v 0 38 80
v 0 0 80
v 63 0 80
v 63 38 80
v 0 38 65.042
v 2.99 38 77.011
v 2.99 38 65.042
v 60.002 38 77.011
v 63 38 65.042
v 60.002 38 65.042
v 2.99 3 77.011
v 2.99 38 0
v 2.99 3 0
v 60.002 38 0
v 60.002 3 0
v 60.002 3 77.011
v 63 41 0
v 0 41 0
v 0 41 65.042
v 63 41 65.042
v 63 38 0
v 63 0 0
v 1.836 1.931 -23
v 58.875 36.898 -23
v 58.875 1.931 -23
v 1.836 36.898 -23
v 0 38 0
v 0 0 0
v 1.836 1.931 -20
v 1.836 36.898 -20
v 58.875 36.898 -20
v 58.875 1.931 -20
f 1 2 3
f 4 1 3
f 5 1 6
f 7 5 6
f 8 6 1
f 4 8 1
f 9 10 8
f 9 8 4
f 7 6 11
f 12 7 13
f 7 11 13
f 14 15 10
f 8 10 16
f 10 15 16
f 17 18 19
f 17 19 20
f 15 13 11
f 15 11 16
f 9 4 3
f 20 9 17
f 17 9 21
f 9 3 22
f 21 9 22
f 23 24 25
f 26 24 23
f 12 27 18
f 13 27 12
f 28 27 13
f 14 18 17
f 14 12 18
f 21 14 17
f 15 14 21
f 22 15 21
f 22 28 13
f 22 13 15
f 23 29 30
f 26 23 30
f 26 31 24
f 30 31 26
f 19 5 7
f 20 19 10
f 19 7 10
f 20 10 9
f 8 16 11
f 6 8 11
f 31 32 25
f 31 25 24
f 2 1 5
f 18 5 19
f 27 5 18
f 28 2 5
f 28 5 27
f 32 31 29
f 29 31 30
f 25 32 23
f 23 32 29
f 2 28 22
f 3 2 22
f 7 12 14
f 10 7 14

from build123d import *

# Parameters (mm, degrees)
ESBO_O2_W                = 63
ESBO_O2_H                = 80
RESSALTO_EXTRUS_O1_DEPTH = 3
RESSALTO_EXTRUS_O2_DEPTH = 35
ESBO_O4_W                = 63
ESBO_O4_H                = 65.041847247
RESSALTO_EXTRUS_O3_DEPTH = 3
ESBO_O6_W                = 57.038627548
ESBO_O6_H                = 34.967547607
RESSALTO_EXTRUS_O4_DEPTH = 3


with BuildPart() as part:
    # Esboço2 → Ressalto-extrusão1 (new body)
    with BuildSketch(Plane(origin=(0, 0, 0), x_dir=(1, 0, 0), z_dir=(0, 1, 0))):
        with Locations((31.5, -40)):
            Rectangle(ESBO_O2_W, ESBO_O2_H)
    extrude(amount=RESSALTO_EXTRUS_O1_DEPTH)

    # Esboço3 → Ressalto-extrusão2 (add)
    with BuildSketch(Plane(origin=(0, 3, 0), x_dir=(1, 0, 0), z_dir=(0, 1, 0))):
        Polygon((63, -80), (63, 0), (60.001706293, 0), (60.001706293, -77.010558462), (2.99035903, -77.010558462), (2.99035903, 0), (0, 0), (0, -80), align=None)
    extrude(amount=RESSALTO_EXTRUS_O2_DEPTH)

    # Esboço4 → Ressalto-extrusão3 (add)
    with BuildSketch(Plane(origin=(0, 38, 0), x_dir=(1, 0, 0), z_dir=(0, 1, 0))):
        with Locations((31.5, -32.520923624)):
            Rectangle(ESBO_O4_W, ESBO_O4_H)
    extrude(amount=RESSALTO_EXTRUS_O3_DEPTH)


with BuildPart() as body_2:
    # Esboço6 → Ressalto-extrusão4 (new body)
    with BuildSketch(Plane(origin=(0, 0, -20), x_dir=(-1, 0, 0), z_dir=(0, 0, -1))):
        with Locations((-30.355722228, 19.414542594)):
            Rectangle(ESBO_O6_W, ESBO_O6_H)
    extrude(amount=RESSALTO_EXTRUS_O4_DEPTH)


solid = Compound([part.part, body_2.part])
